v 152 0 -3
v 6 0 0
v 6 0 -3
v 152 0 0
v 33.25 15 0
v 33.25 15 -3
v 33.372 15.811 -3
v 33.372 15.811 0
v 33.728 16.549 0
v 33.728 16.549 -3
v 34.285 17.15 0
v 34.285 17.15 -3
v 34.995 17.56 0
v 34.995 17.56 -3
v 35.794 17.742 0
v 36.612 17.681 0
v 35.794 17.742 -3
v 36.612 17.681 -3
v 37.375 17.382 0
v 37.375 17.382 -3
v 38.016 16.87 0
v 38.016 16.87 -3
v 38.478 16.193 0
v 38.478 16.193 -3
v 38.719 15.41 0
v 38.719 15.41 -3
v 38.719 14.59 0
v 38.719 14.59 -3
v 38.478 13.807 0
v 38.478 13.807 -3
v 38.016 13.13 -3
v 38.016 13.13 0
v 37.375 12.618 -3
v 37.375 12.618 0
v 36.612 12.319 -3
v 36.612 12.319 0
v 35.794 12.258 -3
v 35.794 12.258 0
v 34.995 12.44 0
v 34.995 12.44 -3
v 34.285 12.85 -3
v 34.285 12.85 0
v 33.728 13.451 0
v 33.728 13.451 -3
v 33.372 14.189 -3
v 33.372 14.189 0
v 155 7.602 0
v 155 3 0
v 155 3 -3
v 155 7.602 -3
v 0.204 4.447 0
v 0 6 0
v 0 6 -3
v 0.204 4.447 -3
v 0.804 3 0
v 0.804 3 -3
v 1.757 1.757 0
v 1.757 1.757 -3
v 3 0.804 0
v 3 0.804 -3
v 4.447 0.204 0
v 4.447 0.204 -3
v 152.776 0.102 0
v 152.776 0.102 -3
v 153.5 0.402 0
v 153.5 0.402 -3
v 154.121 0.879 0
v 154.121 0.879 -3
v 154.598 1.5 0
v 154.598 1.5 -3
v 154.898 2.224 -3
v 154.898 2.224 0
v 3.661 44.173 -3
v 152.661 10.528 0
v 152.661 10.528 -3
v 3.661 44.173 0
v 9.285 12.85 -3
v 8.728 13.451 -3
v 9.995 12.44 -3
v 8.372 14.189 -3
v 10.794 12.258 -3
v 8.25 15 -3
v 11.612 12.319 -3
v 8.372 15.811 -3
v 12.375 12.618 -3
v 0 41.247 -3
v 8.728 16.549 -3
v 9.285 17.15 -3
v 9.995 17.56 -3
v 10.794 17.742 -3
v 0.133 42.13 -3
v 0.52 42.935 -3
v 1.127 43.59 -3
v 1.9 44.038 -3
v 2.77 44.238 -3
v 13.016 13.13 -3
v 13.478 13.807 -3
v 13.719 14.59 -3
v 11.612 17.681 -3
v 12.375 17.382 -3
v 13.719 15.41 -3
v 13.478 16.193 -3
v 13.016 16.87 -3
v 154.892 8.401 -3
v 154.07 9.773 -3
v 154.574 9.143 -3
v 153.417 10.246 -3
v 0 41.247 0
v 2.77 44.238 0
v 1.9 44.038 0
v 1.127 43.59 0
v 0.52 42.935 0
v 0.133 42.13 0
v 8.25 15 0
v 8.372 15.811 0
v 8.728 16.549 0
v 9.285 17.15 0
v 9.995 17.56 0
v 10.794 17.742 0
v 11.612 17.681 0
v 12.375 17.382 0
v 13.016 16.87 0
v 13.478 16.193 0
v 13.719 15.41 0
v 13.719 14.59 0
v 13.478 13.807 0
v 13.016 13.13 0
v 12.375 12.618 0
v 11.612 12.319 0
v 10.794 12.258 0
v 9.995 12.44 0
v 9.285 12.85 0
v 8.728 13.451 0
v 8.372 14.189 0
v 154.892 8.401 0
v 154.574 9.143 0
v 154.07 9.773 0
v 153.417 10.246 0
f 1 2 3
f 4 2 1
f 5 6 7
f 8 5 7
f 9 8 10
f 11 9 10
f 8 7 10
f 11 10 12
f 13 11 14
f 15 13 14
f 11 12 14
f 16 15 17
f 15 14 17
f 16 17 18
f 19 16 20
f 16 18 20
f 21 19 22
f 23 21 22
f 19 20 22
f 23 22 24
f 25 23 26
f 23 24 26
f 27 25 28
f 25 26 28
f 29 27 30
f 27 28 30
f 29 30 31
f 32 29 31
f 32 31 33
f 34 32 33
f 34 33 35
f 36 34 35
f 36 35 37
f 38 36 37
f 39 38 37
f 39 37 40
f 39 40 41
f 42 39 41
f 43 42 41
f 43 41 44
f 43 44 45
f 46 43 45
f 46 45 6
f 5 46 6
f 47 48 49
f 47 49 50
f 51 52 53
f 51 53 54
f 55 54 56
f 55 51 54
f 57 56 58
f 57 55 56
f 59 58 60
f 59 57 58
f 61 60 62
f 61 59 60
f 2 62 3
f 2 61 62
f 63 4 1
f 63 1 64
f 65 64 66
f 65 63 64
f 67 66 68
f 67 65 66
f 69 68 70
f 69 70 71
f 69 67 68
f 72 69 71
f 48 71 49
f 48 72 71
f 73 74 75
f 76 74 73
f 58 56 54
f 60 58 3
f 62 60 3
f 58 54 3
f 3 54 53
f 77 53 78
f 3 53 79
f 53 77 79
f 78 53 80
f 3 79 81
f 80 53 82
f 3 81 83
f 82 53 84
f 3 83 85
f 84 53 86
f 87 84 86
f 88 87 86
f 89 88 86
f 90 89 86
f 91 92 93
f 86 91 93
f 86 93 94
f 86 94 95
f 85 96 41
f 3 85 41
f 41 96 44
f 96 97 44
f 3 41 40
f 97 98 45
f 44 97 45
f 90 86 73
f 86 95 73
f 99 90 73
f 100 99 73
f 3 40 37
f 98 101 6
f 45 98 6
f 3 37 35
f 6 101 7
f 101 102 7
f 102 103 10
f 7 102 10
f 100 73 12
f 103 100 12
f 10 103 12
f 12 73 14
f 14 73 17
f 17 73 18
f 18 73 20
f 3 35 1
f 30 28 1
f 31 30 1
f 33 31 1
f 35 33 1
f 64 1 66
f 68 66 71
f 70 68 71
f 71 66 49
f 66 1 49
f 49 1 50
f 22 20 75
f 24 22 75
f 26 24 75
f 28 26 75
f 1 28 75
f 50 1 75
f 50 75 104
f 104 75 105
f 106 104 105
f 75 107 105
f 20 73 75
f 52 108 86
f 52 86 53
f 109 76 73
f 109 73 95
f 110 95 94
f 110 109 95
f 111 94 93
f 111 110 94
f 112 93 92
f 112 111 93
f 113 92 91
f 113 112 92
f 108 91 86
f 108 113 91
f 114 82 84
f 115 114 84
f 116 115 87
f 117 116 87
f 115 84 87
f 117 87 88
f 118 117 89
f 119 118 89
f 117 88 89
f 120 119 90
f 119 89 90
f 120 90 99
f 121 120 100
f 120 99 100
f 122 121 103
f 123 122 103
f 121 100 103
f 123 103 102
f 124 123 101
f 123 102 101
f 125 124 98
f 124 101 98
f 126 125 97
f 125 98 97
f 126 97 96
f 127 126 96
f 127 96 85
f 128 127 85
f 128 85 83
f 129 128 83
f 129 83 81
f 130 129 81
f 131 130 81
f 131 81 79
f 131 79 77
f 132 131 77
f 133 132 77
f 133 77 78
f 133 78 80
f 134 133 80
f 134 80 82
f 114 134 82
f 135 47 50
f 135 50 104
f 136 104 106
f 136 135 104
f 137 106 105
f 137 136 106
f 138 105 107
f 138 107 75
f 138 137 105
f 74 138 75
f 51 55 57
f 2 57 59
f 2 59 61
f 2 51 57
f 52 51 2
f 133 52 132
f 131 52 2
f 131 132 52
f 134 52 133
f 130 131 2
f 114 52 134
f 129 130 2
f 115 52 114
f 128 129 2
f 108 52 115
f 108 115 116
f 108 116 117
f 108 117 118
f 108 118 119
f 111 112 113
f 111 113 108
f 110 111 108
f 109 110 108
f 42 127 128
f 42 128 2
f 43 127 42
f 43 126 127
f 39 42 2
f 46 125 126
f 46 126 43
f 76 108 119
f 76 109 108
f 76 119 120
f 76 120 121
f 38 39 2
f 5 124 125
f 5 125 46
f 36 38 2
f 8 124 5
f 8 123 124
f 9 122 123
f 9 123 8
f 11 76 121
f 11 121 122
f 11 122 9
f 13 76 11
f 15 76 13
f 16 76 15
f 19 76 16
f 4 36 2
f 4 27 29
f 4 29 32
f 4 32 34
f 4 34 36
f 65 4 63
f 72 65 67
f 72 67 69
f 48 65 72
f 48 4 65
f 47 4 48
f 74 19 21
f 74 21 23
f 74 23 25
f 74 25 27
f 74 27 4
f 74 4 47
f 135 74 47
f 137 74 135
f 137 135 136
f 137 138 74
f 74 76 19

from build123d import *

# Parameters (mm, degrees)
BASE_FLANGE1_DEPTH = 3
SKETCH6_R          = 2.75
CUT_EXTRUDE1_DEPTH = 10


# Sheet-metal steps are written as plain solids
with BuildPart() as part:
    # Sketch1 → Base-Flange1 (new body)
    with BuildSketch(Plane.XY):
        with BuildLine():
            Line((6, 0), (152, 0))
            ThreePointArc((152, 0), (154.121320344, 0.878679656), (155, 3))
            Line((155, 3), (155, 7.601887371))
            ThreePointArc((155, 7.601887371), (154.343325398, 9.475073448), (152.660782614, 10.528210377))
            Line((152.660782614, 10.528210377), (3.660782614, 44.173371668))
            ThreePointArc((3.660782614, 44.173371668), (1.126813923, 43.59037406), (0, 41.247048662))
            Line((0, 41.247048662), (0, 6))
            ThreePointArc((0, 6), (1.757359313, 1.757359313), (6, 0))
        make_face()
    extrude(amount=-BASE_FLANGE1_DEPTH)

    # Sketch6 → Cut-Extrude1 (cut)
    with BuildSketch(Plane(origin=(0, 0, -3), x_dir=(-1, 0, 0), z_dir=(0, 0, -1))):
        with Locations((-11, 15)):
            Circle(SKETCH6_R)
        with Locations((-36, 15)):
            Circle(SKETCH6_R)
    extrude(amount=-CUT_EXTRUDE1_DEPTH, mode=Mode.SUBTRACT)


solid = part.part
